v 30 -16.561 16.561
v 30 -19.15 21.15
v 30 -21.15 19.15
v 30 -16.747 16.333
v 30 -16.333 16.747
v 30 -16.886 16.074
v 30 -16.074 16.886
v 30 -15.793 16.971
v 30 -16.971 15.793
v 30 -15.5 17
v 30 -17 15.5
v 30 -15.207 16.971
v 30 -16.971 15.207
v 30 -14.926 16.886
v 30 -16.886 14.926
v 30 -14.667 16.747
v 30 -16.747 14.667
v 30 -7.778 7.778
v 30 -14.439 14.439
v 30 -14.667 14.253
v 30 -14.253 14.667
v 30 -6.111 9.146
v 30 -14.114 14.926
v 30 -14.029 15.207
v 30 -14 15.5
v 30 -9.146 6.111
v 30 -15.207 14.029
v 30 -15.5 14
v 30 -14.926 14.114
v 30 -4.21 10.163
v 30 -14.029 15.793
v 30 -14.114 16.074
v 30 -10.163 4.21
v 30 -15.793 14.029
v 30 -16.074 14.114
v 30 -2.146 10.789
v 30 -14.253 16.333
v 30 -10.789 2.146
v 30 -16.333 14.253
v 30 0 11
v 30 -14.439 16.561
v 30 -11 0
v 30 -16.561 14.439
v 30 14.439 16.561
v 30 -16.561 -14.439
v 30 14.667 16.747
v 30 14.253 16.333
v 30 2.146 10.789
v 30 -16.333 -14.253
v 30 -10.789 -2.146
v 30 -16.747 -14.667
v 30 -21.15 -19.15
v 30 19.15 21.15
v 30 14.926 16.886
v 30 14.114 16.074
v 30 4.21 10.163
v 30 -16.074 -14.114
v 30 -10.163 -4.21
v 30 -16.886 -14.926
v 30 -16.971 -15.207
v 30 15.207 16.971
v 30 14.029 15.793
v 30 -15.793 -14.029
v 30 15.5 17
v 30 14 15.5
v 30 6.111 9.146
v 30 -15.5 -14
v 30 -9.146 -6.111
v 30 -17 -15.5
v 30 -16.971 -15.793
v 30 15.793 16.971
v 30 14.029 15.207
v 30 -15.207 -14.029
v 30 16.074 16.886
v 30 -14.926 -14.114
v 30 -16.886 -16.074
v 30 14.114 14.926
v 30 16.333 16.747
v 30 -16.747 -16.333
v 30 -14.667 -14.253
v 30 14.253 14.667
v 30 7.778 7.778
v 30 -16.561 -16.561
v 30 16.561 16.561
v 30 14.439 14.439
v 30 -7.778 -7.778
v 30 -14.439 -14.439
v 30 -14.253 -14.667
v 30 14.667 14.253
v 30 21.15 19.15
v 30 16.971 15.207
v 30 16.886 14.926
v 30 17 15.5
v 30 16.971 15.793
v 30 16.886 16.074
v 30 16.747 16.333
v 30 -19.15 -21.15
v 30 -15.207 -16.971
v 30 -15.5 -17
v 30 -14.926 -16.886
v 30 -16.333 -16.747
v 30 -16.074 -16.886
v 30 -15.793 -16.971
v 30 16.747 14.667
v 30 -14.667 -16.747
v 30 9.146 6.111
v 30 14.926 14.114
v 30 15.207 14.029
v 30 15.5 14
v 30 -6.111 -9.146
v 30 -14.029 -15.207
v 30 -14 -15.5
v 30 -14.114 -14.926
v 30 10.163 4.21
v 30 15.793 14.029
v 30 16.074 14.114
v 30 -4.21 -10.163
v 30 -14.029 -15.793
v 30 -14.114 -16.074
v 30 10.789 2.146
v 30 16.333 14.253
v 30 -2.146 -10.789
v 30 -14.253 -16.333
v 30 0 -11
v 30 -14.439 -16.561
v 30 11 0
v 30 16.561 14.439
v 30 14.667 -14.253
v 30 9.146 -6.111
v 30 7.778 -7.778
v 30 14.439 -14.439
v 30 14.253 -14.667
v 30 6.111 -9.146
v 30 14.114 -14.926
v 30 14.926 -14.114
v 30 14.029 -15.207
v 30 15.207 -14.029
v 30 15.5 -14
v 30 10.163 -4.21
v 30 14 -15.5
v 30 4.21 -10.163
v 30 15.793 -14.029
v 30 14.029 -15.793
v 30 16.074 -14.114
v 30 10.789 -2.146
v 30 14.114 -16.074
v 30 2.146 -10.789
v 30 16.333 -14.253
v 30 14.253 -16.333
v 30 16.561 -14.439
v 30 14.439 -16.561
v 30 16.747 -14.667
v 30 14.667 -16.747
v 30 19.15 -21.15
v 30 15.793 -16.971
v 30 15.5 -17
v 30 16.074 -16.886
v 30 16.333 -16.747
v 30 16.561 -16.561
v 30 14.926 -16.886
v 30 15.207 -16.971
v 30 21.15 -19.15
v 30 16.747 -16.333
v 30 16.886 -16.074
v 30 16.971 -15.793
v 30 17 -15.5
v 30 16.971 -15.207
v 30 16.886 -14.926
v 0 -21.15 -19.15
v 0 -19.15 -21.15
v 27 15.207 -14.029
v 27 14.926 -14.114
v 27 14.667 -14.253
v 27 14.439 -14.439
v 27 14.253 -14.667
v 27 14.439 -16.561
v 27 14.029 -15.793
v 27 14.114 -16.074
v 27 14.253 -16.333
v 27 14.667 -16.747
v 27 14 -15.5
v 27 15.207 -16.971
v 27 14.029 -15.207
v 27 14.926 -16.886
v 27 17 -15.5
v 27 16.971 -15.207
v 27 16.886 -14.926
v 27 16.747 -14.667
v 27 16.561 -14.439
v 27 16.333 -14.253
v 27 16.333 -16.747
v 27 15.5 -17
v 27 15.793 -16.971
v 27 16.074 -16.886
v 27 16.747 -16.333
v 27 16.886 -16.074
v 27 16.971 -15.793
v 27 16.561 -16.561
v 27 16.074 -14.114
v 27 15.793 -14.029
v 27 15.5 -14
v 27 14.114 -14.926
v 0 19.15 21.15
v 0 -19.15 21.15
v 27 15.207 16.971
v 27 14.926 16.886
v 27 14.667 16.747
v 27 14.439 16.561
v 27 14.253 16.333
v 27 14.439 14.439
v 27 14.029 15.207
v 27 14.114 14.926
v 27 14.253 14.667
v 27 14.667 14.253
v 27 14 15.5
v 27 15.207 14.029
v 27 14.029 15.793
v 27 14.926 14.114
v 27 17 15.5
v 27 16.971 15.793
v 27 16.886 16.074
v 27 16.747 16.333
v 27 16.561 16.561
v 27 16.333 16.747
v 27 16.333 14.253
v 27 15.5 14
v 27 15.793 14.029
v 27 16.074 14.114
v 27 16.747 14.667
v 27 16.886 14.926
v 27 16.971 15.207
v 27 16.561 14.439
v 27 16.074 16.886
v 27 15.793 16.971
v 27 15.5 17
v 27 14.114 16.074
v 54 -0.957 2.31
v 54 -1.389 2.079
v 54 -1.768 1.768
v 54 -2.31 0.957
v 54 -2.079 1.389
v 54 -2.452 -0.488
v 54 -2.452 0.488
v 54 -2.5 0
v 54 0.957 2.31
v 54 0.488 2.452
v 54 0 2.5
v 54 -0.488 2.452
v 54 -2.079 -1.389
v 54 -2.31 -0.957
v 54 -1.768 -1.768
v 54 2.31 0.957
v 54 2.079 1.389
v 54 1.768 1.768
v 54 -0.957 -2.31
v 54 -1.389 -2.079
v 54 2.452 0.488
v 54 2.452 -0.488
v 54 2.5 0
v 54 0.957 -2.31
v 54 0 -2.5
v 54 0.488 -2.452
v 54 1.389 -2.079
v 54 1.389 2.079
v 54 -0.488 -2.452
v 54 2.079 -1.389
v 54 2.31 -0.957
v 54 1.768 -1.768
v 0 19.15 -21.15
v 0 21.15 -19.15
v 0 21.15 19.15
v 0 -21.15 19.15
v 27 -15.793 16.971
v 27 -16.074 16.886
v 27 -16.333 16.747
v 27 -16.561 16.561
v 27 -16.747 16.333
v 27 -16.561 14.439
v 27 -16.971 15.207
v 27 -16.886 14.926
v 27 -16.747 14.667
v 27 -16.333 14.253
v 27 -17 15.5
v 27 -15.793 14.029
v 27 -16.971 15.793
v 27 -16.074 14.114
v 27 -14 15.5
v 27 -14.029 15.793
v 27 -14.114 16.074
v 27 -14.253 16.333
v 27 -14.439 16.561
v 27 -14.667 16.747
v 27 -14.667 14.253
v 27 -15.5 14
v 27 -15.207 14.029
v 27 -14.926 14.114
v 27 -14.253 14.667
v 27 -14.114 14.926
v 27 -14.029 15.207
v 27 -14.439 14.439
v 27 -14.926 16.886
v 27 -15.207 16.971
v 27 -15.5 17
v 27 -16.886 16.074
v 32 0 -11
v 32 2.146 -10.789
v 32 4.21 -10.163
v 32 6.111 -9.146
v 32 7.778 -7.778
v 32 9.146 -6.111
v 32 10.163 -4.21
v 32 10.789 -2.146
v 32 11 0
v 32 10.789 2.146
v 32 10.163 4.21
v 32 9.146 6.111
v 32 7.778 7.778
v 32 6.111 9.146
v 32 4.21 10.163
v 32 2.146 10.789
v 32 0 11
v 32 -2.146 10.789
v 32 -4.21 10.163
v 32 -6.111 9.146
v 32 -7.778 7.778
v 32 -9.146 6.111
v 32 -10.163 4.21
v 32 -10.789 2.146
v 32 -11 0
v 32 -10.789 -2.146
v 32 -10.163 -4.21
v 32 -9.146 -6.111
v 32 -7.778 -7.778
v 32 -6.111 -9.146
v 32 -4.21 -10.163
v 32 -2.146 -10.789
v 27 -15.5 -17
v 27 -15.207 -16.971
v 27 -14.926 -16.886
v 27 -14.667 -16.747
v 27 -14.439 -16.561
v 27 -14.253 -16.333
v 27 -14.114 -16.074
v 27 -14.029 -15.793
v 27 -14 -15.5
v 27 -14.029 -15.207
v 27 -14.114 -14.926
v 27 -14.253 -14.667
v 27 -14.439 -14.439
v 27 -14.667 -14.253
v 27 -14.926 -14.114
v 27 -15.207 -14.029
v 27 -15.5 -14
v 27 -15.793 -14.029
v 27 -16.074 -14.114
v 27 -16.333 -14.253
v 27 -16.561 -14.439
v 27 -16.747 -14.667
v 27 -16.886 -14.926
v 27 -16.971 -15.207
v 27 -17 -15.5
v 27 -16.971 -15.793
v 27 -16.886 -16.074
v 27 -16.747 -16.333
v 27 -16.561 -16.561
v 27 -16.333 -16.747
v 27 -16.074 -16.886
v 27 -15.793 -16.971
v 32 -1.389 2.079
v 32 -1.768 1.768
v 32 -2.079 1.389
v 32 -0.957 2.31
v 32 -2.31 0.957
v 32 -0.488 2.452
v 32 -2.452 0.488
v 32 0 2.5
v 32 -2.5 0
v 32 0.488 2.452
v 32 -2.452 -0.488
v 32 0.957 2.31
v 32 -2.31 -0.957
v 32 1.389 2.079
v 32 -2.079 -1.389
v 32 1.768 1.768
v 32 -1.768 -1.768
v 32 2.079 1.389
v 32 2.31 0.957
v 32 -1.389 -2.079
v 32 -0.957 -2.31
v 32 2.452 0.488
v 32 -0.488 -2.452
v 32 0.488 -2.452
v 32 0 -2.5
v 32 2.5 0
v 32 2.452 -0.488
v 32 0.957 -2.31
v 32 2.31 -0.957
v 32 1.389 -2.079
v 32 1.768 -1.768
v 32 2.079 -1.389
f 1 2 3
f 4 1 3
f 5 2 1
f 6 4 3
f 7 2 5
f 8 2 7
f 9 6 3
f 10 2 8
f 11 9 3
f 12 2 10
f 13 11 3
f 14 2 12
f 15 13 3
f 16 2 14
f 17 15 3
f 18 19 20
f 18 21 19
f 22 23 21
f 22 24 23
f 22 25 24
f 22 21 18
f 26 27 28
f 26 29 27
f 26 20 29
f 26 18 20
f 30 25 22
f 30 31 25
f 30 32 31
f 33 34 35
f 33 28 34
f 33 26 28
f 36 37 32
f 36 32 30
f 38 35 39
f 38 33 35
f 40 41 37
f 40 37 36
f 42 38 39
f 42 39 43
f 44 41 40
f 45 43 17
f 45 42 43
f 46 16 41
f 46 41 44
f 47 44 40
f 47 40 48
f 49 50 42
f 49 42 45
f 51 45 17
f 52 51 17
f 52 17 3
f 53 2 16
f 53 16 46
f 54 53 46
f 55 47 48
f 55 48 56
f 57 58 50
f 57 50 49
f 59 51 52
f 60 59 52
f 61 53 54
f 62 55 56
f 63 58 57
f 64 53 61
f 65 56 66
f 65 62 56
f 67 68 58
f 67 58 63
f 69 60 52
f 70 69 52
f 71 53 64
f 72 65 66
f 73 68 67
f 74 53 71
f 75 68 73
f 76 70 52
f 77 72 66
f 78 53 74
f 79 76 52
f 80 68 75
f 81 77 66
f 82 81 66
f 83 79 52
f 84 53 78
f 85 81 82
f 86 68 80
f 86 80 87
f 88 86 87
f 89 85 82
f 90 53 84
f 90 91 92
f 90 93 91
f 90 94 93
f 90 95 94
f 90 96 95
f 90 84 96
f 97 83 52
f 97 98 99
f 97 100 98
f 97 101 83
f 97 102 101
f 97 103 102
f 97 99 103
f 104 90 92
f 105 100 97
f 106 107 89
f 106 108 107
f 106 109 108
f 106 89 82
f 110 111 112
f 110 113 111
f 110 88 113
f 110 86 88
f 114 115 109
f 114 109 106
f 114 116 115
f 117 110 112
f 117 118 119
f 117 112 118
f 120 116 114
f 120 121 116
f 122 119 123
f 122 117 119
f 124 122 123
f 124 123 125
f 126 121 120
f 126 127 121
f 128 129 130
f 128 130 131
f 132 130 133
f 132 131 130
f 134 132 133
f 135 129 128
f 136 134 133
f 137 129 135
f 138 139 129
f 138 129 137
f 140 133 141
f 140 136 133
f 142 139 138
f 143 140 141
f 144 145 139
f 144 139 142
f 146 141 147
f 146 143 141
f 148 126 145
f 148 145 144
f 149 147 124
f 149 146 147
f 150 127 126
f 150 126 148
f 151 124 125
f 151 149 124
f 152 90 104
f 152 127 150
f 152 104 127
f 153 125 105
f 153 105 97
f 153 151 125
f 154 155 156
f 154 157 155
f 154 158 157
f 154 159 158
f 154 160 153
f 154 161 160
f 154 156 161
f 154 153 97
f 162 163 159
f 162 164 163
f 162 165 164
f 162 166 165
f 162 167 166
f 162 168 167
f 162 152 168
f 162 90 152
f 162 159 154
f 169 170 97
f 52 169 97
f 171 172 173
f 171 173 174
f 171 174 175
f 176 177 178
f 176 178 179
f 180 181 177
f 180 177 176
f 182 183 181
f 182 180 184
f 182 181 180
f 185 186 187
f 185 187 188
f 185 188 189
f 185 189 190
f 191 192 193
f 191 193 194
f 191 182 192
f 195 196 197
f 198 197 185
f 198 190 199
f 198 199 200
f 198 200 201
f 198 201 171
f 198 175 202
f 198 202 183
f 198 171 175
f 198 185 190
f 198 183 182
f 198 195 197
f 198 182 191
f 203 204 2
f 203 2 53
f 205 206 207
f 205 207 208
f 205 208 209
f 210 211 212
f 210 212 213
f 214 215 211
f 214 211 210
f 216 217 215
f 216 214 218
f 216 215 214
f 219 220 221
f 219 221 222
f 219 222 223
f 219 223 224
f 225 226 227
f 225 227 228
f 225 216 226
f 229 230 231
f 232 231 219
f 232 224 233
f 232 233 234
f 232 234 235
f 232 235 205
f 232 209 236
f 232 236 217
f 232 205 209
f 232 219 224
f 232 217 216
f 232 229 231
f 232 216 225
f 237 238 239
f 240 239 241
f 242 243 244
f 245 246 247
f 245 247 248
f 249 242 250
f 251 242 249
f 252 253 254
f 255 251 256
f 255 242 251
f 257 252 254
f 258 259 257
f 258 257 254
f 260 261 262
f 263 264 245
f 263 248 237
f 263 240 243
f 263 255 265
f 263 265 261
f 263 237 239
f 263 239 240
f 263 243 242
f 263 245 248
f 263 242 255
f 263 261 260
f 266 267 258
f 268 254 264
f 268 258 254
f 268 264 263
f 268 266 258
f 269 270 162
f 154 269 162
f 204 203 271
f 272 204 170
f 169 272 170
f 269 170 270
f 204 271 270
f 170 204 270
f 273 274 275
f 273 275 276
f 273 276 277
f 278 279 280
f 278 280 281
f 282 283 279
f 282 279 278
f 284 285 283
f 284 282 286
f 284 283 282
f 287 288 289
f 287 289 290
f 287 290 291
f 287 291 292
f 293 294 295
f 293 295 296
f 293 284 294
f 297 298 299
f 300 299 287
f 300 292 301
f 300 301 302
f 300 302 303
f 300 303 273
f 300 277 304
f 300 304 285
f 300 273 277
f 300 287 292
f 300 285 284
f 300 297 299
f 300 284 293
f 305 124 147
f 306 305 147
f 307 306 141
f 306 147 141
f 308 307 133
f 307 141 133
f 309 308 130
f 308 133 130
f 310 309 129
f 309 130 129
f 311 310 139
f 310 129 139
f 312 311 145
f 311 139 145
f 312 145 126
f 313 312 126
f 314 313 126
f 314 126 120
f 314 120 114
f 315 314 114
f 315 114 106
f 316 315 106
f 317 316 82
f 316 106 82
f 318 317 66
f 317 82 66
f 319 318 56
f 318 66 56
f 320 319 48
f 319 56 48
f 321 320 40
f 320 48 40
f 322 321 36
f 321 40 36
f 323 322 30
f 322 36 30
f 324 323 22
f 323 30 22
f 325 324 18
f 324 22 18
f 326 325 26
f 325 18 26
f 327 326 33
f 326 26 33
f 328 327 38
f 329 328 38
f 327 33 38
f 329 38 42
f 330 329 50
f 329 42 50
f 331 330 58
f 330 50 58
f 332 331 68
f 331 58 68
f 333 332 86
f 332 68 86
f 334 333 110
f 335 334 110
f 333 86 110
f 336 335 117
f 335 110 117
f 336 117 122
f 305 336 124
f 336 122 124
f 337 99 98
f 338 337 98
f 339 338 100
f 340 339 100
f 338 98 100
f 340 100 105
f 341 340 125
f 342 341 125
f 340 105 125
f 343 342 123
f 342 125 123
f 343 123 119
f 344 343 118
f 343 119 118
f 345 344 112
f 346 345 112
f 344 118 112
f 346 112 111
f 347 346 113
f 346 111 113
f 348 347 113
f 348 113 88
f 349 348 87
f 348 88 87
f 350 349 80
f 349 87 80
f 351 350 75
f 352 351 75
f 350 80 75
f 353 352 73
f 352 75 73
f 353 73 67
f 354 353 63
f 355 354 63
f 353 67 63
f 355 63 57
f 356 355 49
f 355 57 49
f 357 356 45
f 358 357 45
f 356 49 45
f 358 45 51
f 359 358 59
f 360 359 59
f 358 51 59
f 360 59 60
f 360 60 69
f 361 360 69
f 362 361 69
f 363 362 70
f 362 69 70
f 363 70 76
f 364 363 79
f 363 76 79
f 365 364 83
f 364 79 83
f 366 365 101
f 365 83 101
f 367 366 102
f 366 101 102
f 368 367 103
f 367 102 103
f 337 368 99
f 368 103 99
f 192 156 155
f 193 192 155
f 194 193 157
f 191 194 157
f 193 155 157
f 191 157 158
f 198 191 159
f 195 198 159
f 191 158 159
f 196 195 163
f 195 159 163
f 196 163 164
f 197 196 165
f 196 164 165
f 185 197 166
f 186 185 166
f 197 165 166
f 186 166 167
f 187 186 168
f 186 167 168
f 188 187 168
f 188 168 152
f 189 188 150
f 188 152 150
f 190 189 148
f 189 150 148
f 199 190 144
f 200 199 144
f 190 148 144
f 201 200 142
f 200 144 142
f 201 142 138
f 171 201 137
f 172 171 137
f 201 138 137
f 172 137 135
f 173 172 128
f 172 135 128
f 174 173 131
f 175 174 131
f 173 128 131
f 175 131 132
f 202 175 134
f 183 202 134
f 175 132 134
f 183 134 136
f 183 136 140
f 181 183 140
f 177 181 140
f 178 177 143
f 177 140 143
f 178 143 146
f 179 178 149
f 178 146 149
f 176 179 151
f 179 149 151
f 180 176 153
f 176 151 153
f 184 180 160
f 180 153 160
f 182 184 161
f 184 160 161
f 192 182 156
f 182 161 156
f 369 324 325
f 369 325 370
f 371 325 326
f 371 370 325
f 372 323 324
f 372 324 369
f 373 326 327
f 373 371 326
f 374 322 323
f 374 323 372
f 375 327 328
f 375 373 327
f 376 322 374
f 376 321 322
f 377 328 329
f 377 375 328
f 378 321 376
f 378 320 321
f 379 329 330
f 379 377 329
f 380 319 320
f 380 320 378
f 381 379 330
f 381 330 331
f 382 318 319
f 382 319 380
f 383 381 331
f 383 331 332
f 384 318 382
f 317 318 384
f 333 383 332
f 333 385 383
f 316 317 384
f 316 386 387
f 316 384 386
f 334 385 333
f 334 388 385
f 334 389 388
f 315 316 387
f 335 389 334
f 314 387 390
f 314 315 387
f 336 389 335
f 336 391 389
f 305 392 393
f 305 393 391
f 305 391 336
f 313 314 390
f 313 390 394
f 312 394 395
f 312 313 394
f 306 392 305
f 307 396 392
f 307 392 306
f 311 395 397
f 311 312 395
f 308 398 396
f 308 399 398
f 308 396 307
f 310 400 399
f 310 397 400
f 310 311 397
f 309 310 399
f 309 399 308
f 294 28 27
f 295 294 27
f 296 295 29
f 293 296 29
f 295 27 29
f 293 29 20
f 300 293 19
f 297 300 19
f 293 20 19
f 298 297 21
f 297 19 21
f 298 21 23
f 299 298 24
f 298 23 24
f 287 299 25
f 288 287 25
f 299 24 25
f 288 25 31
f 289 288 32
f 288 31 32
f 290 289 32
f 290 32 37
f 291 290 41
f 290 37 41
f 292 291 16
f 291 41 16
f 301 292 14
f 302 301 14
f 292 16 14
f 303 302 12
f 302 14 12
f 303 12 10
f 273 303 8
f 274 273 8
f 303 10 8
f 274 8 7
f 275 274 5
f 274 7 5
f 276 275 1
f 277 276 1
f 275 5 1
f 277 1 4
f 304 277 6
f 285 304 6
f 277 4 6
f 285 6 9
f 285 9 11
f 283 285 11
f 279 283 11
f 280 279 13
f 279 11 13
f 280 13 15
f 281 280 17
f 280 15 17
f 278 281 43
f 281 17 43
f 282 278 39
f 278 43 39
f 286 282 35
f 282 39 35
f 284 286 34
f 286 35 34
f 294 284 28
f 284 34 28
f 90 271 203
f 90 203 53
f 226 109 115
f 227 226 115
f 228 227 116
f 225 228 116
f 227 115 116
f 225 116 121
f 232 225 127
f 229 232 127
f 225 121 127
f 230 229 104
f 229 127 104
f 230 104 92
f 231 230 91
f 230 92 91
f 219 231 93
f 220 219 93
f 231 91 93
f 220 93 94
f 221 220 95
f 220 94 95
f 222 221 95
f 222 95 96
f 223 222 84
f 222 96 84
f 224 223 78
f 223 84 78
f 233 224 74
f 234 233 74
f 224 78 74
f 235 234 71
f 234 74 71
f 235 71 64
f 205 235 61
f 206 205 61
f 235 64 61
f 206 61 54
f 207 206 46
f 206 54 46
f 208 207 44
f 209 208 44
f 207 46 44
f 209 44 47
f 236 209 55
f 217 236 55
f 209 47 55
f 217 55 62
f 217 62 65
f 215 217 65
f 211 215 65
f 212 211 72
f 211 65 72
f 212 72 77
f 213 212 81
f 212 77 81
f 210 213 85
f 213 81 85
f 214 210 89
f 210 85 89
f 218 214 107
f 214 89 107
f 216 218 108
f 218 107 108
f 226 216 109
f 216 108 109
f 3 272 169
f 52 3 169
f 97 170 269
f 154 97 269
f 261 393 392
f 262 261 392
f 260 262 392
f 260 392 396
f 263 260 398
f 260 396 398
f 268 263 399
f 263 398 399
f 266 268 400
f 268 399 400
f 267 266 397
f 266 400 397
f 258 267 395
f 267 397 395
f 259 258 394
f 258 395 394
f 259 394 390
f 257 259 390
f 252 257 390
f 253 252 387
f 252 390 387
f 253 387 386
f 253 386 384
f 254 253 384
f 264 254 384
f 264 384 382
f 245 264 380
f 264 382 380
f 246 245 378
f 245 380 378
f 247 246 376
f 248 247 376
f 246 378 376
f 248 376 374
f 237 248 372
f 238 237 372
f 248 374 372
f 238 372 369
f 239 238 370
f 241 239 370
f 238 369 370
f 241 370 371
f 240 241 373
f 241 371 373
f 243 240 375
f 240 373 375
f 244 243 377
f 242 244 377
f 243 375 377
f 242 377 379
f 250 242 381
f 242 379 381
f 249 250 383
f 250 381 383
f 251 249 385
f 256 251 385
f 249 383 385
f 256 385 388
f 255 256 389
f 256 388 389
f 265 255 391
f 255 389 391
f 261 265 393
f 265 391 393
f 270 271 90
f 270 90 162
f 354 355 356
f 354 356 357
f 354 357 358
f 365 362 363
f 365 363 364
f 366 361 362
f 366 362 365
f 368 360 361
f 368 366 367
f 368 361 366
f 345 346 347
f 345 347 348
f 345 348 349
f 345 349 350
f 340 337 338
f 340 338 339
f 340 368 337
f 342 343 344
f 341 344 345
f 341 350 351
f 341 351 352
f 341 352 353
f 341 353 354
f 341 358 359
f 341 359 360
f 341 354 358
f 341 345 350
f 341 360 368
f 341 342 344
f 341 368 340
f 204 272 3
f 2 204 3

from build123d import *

# Parameters (mm, degrees)
SKETCH_1_W          = 42.3
SKETCH_1_H          = 42.3
EXTRUDE_1_DEPTH     = 30
CHAMFER_1_SIZE      = 2
SKETCH_2_R          = 1.5
CUT_EXTRUDE_1_DEPTH = 3
SKETCH_3_R          = 11
EXTRUDE_2_DEPTH     = 2
SKETCH_4_R          = 2.5
EXTRUDE_3_DEPTH     = 22


with BuildPart() as part:
    # 草图1 → 凸台-拉伸1 (new body)
    with BuildSketch(Plane(origin=(0, 0, 0), x_dir=(0, 0, -1), z_dir=(1, 0, 0))):
        Rectangle(SKETCH_1_W, SKETCH_1_H)
    extrude(amount=EXTRUDE_1_DEPTH)

    # 倒角1
    chamfer_1_edges = [part.edges().sort_by_distance(p)[0] for p in [
        (15, 21.15, 21.15),
        (15, 21.15, -21.15),
        (15, -21.15, -21.15),
        (15, -21.15, 21.15),
    ]]
    chamfer(chamfer_1_edges, length=CHAMFER_1_SIZE)

    # 草图2 → 切除-拉伸1 (cut)
    with BuildSketch(Plane(origin=(30, 0, 0), x_dir=(0, 0, -1), z_dir=(1, 0, 0))):
        with Locations((-15.5, 15.5)):
            Circle(SKETCH_2_R)
        with Locations((15.5, 15.5)):
            Circle(SKETCH_2_R)
        with Locations((15.5, -15.5)):
            Circle(SKETCH_2_R)
        with Locations((-15.5, -15.5)):
            Circle(SKETCH_2_R)
    extrude(amount=-CUT_EXTRUDE_1_DEPTH, mode=Mode.SUBTRACT)

    # 草图3 → 凸台-拉伸2 (add)
    with BuildSketch(Plane(origin=(30, 0, 0), x_dir=(0, 0, -1), z_dir=(1, 0, 0))):
        Circle(SKETCH_3_R)
    extrude(amount=EXTRUDE_2_DEPTH)

    # 草图4 → 凸台-拉伸3 (add)
    with BuildSketch(Plane(origin=(32, 0, 0), x_dir=(0, 0, -1), z_dir=(1, 0, 0))):
        Circle(SKETCH_4_R)
    extrude(amount=EXTRUDE_3_DEPTH)


solid = part.part
